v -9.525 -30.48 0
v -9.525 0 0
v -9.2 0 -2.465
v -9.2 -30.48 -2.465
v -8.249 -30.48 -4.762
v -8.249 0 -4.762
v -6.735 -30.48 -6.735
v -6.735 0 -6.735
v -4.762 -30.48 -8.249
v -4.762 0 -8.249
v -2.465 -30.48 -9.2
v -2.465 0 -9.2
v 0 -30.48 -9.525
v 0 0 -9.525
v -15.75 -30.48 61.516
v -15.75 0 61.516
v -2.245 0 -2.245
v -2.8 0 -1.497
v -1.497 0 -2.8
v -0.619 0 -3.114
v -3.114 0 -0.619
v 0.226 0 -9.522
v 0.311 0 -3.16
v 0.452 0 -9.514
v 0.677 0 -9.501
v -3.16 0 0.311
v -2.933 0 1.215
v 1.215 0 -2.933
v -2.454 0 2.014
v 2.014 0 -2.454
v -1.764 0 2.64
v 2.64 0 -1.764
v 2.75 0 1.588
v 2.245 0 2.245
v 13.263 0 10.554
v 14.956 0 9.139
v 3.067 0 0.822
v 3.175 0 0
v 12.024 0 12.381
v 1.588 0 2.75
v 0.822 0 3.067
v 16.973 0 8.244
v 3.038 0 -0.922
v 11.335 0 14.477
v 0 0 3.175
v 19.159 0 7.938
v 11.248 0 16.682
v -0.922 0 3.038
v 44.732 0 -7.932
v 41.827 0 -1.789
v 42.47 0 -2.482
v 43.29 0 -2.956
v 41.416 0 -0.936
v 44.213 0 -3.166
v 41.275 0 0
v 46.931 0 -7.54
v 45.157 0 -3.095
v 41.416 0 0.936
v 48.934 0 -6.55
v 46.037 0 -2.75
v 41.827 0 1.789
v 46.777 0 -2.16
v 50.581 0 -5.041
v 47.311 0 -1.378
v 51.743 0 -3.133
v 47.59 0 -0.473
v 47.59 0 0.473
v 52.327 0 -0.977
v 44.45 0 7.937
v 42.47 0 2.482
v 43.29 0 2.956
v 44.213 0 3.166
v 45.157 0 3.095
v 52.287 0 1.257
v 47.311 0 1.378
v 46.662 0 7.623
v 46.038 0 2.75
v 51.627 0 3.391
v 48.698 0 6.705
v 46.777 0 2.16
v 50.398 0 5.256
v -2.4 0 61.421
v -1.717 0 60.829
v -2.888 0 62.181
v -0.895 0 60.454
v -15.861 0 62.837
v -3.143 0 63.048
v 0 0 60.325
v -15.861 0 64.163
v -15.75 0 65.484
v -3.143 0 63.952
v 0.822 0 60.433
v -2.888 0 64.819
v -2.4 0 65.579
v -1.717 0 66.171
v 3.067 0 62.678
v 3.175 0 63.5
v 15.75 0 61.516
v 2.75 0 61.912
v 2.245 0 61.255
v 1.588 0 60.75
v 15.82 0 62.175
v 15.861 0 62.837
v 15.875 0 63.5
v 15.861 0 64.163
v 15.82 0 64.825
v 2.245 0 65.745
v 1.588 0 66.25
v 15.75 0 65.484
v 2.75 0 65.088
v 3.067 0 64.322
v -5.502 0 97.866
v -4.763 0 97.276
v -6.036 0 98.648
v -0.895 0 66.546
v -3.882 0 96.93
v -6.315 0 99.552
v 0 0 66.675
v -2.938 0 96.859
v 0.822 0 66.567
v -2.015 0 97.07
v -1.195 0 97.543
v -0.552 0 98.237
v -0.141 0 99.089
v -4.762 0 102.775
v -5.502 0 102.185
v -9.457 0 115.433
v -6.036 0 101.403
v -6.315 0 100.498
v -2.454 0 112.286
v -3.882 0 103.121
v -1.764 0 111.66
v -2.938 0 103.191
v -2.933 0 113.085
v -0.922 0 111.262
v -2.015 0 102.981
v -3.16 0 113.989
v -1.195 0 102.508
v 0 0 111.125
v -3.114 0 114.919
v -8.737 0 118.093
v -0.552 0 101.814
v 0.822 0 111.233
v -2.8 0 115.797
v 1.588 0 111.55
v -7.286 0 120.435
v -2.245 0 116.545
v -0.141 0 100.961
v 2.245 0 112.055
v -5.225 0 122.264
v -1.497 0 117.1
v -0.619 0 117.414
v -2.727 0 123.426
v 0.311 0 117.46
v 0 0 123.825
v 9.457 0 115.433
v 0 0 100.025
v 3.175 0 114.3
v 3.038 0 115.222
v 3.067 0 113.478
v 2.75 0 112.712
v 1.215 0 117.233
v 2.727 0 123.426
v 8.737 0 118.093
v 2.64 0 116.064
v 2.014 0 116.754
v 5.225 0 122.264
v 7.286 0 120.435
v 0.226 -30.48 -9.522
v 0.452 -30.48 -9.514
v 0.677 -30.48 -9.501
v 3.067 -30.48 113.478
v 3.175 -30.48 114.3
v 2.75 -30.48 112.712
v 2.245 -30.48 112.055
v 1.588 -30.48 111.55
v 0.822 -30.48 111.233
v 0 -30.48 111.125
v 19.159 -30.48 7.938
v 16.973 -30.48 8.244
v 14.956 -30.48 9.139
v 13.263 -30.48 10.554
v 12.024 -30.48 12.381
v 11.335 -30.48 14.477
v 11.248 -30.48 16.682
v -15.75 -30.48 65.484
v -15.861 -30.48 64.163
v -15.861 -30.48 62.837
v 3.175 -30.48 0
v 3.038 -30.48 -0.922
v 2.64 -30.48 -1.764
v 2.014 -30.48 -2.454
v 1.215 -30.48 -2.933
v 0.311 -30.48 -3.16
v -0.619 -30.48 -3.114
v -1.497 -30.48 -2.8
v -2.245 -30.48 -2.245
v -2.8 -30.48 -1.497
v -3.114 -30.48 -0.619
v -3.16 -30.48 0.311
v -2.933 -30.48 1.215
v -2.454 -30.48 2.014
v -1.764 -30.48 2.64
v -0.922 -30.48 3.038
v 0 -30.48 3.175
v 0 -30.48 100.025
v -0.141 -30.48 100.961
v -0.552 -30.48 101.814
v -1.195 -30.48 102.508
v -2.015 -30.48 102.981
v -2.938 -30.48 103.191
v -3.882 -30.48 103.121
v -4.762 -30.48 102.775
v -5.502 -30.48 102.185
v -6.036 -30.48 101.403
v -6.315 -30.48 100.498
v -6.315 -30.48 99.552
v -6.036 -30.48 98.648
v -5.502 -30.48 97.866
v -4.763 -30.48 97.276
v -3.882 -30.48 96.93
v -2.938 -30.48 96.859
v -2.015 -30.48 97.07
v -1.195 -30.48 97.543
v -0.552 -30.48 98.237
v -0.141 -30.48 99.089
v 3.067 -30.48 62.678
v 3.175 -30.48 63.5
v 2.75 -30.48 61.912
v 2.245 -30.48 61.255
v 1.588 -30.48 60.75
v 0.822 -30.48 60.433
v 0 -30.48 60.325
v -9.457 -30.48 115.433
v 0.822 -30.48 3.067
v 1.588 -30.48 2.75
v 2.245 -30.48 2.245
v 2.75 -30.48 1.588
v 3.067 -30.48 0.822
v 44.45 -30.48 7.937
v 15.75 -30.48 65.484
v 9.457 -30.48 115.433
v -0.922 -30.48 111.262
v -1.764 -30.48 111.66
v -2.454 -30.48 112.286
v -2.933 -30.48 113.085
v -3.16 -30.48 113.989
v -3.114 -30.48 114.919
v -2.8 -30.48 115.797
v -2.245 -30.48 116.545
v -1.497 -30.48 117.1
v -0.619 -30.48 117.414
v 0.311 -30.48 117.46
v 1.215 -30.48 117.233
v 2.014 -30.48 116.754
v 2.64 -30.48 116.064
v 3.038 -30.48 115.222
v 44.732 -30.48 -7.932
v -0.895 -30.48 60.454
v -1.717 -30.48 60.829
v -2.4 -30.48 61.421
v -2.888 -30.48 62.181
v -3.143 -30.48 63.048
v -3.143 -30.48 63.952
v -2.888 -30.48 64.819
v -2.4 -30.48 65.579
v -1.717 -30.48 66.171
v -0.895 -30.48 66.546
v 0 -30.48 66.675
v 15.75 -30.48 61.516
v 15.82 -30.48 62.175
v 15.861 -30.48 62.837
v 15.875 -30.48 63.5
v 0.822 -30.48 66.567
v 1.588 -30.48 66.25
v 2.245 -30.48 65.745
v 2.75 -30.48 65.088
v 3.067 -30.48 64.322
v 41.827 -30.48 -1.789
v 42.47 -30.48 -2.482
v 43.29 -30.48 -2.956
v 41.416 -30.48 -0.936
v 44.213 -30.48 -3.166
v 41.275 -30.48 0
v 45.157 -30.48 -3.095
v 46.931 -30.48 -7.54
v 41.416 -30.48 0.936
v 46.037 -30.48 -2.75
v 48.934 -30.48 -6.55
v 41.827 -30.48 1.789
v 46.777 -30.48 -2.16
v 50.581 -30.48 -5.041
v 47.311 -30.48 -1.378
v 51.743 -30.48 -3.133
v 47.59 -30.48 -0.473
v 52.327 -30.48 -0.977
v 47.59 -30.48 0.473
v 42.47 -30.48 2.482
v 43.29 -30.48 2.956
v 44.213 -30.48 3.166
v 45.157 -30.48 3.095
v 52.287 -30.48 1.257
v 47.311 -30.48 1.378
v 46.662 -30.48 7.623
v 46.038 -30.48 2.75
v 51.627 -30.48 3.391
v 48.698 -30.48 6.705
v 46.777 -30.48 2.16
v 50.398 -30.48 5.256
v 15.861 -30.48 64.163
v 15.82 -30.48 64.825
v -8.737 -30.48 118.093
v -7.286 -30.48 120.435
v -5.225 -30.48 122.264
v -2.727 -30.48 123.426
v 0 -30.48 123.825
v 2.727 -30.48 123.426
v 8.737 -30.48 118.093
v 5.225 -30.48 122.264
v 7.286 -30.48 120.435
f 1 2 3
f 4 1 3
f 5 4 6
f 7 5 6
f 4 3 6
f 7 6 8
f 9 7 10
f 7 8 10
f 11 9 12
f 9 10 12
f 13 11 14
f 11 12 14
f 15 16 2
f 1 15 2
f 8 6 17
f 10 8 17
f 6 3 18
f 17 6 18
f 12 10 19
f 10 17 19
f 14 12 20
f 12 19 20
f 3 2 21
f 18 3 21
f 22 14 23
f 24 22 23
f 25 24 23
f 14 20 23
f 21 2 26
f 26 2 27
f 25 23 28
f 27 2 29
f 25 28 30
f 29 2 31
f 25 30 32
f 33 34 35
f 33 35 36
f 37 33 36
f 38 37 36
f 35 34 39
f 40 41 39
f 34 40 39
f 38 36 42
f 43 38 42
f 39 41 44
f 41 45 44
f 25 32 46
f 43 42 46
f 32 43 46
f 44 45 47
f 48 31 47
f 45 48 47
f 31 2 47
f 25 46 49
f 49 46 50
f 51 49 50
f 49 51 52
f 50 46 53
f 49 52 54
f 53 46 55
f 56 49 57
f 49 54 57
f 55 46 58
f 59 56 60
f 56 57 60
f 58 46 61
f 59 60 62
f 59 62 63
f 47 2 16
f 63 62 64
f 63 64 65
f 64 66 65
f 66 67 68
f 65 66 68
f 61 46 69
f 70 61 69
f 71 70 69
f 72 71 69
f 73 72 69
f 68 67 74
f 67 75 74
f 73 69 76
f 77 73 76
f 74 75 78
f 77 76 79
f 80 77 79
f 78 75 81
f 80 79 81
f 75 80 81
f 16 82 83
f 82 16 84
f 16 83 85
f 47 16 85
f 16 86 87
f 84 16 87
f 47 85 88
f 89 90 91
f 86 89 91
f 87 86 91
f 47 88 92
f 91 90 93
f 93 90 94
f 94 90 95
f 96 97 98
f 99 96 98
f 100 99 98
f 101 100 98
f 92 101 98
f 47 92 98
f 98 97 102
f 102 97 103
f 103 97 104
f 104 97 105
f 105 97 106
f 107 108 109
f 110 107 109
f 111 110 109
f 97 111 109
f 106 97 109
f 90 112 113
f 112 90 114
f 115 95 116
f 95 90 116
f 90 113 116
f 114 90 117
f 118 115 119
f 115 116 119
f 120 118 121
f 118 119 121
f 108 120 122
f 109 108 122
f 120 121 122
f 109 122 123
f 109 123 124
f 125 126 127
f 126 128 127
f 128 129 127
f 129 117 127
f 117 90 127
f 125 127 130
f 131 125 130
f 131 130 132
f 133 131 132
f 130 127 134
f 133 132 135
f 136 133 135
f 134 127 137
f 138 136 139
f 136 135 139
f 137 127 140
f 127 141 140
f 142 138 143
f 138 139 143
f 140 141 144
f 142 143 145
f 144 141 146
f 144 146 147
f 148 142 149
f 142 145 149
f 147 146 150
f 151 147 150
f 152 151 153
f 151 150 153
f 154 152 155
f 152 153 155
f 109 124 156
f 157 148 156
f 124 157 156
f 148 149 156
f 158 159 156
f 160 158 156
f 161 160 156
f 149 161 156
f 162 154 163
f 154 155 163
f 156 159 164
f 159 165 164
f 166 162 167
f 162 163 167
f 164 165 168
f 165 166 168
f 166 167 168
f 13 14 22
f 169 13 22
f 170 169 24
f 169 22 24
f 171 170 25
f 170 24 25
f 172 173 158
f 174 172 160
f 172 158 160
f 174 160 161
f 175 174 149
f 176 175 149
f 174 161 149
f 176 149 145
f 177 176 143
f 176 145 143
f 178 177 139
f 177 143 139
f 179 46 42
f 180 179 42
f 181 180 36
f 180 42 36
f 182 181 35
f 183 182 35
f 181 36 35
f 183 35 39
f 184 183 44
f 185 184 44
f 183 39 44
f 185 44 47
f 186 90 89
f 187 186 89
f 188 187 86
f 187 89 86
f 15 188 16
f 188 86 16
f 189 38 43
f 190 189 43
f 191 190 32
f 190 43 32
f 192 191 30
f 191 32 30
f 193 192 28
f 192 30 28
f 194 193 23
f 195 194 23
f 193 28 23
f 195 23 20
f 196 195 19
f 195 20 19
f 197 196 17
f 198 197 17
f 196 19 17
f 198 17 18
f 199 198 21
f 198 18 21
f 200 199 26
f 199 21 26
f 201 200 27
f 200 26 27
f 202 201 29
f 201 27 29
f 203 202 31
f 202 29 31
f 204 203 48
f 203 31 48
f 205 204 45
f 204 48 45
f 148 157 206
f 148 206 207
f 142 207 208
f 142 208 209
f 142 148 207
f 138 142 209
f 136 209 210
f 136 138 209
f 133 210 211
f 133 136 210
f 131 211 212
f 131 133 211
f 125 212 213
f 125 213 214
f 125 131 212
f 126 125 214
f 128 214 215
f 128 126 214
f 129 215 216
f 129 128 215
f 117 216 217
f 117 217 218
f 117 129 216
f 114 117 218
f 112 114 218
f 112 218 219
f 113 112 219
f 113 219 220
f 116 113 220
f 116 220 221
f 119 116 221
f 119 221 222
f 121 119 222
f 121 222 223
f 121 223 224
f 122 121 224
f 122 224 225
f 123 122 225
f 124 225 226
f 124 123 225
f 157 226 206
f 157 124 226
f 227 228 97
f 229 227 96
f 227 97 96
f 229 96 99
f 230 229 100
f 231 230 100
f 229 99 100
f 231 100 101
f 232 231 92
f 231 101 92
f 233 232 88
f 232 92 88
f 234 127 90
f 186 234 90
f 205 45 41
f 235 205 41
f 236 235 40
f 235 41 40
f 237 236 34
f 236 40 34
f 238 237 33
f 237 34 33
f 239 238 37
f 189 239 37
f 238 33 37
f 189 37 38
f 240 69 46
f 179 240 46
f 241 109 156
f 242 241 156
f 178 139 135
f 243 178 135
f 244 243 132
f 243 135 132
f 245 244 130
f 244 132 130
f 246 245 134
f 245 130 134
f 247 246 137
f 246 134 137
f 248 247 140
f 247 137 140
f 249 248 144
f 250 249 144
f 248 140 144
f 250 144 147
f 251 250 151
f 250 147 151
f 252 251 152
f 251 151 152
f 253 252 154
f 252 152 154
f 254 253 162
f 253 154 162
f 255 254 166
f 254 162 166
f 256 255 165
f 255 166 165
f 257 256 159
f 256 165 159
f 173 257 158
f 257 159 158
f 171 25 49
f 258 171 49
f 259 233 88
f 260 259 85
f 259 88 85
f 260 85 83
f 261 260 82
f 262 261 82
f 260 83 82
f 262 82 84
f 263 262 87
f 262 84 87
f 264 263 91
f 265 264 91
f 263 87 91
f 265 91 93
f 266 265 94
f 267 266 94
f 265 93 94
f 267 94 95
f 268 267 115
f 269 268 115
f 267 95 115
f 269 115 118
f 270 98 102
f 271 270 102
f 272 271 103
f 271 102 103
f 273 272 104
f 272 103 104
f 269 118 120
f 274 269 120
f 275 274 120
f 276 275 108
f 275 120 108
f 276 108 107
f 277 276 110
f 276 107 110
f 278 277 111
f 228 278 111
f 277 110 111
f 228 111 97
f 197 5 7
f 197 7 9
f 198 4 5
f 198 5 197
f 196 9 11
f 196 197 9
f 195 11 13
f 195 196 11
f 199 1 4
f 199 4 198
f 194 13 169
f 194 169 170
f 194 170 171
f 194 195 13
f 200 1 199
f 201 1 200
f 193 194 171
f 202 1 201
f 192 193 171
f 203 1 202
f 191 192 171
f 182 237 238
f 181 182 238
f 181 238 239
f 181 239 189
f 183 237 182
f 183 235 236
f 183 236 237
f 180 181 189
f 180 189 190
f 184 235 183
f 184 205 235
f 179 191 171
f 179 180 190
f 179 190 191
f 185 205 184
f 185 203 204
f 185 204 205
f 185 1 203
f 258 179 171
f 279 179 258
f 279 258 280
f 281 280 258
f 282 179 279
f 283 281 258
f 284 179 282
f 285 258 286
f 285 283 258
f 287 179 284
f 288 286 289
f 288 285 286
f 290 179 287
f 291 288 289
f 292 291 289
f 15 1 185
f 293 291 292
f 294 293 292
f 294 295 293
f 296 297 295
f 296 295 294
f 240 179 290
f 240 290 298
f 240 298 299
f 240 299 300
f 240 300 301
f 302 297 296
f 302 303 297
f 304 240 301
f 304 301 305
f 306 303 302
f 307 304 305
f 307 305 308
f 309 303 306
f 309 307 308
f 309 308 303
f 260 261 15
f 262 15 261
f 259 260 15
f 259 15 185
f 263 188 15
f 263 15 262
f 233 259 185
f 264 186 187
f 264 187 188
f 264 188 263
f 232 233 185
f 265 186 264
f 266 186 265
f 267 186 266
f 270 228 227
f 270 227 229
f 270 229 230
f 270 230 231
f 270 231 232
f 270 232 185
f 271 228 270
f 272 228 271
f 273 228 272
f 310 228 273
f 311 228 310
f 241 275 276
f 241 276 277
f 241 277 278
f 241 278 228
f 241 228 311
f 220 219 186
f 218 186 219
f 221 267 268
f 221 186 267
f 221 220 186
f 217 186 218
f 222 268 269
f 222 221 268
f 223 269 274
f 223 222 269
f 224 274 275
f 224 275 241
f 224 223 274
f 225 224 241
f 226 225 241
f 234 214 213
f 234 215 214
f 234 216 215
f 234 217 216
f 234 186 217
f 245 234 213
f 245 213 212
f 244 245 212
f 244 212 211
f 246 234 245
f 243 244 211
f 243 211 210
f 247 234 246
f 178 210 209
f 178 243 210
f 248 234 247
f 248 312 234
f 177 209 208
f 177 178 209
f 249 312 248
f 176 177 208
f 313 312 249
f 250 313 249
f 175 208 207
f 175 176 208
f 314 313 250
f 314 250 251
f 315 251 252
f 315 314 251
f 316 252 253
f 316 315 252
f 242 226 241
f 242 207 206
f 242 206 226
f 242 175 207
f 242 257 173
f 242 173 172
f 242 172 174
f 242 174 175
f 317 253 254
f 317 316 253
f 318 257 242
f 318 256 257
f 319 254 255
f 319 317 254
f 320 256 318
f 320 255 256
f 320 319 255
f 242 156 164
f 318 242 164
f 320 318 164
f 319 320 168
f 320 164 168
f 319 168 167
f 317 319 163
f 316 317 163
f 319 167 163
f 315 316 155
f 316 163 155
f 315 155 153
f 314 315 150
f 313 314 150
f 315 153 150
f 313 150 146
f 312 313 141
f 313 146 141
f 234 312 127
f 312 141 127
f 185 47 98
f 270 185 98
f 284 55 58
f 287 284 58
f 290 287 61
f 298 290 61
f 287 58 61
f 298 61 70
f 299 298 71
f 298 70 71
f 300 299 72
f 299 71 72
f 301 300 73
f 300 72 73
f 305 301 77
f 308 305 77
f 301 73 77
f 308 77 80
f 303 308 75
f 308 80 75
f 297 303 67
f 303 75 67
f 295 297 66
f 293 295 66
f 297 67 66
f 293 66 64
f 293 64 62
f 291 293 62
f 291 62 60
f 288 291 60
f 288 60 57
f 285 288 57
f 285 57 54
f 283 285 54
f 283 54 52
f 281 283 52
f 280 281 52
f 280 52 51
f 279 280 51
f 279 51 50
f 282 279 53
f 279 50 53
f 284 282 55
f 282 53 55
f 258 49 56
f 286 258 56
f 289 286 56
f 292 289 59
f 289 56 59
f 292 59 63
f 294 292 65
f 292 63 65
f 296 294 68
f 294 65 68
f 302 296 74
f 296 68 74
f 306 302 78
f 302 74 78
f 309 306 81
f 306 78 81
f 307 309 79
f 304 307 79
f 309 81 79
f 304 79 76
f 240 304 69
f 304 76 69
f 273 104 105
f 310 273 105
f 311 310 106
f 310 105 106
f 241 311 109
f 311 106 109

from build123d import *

# Parameters (mm, degrees)
F0_R     = 3.175
F1_DEPTH = 30.48


with BuildPart() as f1:
    # F0 (on Front) → F1 (new body)
    with BuildSketch(Plane.XZ):
        with BuildLine():
            ThreePointArc((3.175, 0), (-2.2450640303, -2.2450640303), (0, 3.175))
            Line((0, 3.175), (0, 9.525))
            ThreePointArc((0, 9.525), (-6.7351920908, 6.7351920908), (-9.525, 0))
            ThreePointArc((-9.525, 0), (-6.7351920908, -6.7351920908), (0, -9.525))
            Line((0, -9.525), (0.6773435479, -9.500885786))
            ThreePointArc((0.6773435479, -9.500885786), (6.9705567315, -6.4912990883), (9.525, 0))
            Line((9.525, 0), (3.175, 0))
        make_face()
        with BuildLine():
            ThreePointArc((-9.525, 0), (-6.7351920908, 6.7351920908), (0, 9.525))
            Line((0, 9.525), (0, 47.625))
            ThreePointArc((0, 47.625), (-10.5003045198, 51.5937314833), (-15.7504812749, 61.51556945))
            Line((-15.7504812749, 61.51556945), (-9.525, 0))
        make_face()
        with BuildLine():
            Line((0, 47.625), (0, 9.525))
            ThreePointArc((0, 9.525), (6.7351920908, 6.7351920908), (9.525, 0))
            Line((9.525, 0), (36.5125, 0))
            ThreePointArc((36.5125, 0), (38.8373399243, 5.6126600757), (44.45, 7.9375))
            Line((44.45, 7.9375), (19.1585847945, 7.9375))
            ThreePointArc((19.1585847945, 7.9375), (13.2627721486, 10.5543077133), (11.2481720528, 16.6820867415))
            Line((11.2481720528, 16.6820867415), (15.7504812749, 61.51556945))
            ThreePointArc((15.7504812749, 61.51556945), (10.5003045198, 51.5937314833), (0, 47.625))
        make_face()
        with BuildLine():
            Line((36.5125, 0), (9.525, 0))
            ThreePointArc((9.525, 0), (6.9705567315, -6.4912990883), (0.6773435479, -9.500885786))
            Line((0.6773435479, -9.500885786), (44.7324052746, -7.9324746146))
            ThreePointArc((44.7324052746, -7.9324746146), (38.9380895153, -5.7116327839), (36.5125, 0))
        make_face()
        with BuildLine():
            ThreePointArc((-15.7504812749, 61.51556945), (-10.5003045198, 51.5937314833), (0, 47.625))
            Line((0, 47.625), (0, 60.325))
            ThreePointArc((0, 60.325), (-3.175, 63.5), (0, 66.675))
            Line((0, 66.675), (0, 79.375))
            ThreePointArc((0, 79.375), (-10.5003045198, 75.4062685167), (-15.7504812749, 65.48443055))
            ThreePointArc((-15.7504812749, 65.48443055), (-15.875, 63.5), (-15.7504812749, 61.51556945))
        make_face()
        with BuildLine():
            Line((0, 60.325), (0, 47.625))
            ThreePointArc((0, 47.625), (10.5003045198, 51.5937314833), (15.7504812749, 61.51556945))
            ThreePointArc((15.7504812749, 61.51556945), (15.8438397373, 62.5058333237), (15.875, 63.5))
            ThreePointArc((15.875, 63.5), (15.8438397373, 64.4941666763), (15.7504812749, 65.48443055))
            ThreePointArc((15.7504812749, 65.48443055), (10.5003045198, 75.4062685167), (0, 79.375))
            Line((0, 79.375), (0, 66.675))
            ThreePointArc((0, 66.675), (2.2450640303, 65.7450640303), (3.175, 63.5))
            ThreePointArc((3.175, 63.5), (2.2450640303, 61.2549359697), (0, 60.325))
        make_face()
        with BuildLine():
            ThreePointArc((44.45, 7.9375), (38.8373399243, 5.6126600757), (36.5125, 0))
            ThreePointArc((36.5125, 0), (38.9380895153, -5.7116327839), (44.7324052746, -7.9324746146))
            ThreePointArc((44.7324052746, -7.9324746146), (50.1616327839, -5.5119104847), (52.3875, 0))
            ThreePointArc((52.3875, 0), (50.0626600757, 5.6126600757), (44.45, 7.9375))
        make_face()
        with BuildLine():
            ThreePointArc((47.625, 0), (44.45, -3.175), (41.275, 0))
            ThreePointArc((41.275, 0), (44.45, 3.175), (47.625, 0))
        make_face(mode=Mode.SUBTRACT)
        with BuildLine():
            ThreePointArc((0, -9.525), (0.3388863295, -9.5189695375), (0.6773435479, -9.500885786))
            Line((0.6773435479, -9.500885786), (0, -9.525))
        make_face()
        with BuildLine():
            Line((-9.4573865922, 115.4329006338), (-15.7504812749, 65.48443055))
            ThreePointArc((-15.7504812749, 65.48443055), (-10.5003045198, 75.4062685167), (0, 79.375))
            Line((0, 79.375), (0, 100.0252))
            Line((0, 100.0252), (0, 104.775))
            ThreePointArc((0, 104.775), (-7.1244825615, 107.9780245784), (-9.4573865922, 115.4329006338))
        make_face()
        with Locations((-3.175, 100.0252)):
            Circle(F0_R, mode=Mode.SUBTRACT)
        with BuildLine():
            Line((0, 100.0252), (0, 79.375))
            ThreePointArc((0, 79.375), (10.5003045198, 75.4062685167), (15.7504812749, 65.48443055))
            Line((15.7504812749, 65.48443055), (9.4573865922, 115.4329006338))
            ThreePointArc((9.4573865922, 115.4329006338), (9.5080816228, 114.8674582405), (9.525, 114.3))
            ThreePointArc((9.525, 114.3), (6.7351920908, 107.5648079092), (0, 104.775))
            Line((0, 104.775), (0, 100.0252))
        make_face()
        with BuildLine():
            ThreePointArc((9.4573865922, 115.4329006338), (0, 123.825), (-9.4573865922, 115.4329006338))
            ThreePointArc((-9.4573865922, 115.4329006338), (-7.1244825615, 107.9780245784), (0, 104.775))
            ThreePointArc((0, 104.775), (6.7351920908, 107.5648079092), (9.525, 114.3))
            ThreePointArc((9.525, 114.3), (9.5080816228, 114.8674582405), (9.4573865922, 115.4329006338))
        make_face()
        with BuildLine():
            ThreePointArc((3.175, 114.3), (2.2450640303, 112.0549359697), (0, 111.125))
            ThreePointArc((0, 111.125), (-2.2450640303, 116.5450640303), (3.175, 114.3))
        make_face(mode=Mode.SUBTRACT)
        with BuildLine():
            Line((0, 9.525), (0, 3.175))
            ThreePointArc((0, 3.175), (2.2450640303, 2.2450640303), (3.175, 0))
            Line((3.175, 0), (9.525, 0))
            ThreePointArc((9.525, 0), (6.7351920908, 6.7351920908), (0, 9.525))
        make_face()
    extrude(amount=F1_DEPTH)


solid = f1.part
